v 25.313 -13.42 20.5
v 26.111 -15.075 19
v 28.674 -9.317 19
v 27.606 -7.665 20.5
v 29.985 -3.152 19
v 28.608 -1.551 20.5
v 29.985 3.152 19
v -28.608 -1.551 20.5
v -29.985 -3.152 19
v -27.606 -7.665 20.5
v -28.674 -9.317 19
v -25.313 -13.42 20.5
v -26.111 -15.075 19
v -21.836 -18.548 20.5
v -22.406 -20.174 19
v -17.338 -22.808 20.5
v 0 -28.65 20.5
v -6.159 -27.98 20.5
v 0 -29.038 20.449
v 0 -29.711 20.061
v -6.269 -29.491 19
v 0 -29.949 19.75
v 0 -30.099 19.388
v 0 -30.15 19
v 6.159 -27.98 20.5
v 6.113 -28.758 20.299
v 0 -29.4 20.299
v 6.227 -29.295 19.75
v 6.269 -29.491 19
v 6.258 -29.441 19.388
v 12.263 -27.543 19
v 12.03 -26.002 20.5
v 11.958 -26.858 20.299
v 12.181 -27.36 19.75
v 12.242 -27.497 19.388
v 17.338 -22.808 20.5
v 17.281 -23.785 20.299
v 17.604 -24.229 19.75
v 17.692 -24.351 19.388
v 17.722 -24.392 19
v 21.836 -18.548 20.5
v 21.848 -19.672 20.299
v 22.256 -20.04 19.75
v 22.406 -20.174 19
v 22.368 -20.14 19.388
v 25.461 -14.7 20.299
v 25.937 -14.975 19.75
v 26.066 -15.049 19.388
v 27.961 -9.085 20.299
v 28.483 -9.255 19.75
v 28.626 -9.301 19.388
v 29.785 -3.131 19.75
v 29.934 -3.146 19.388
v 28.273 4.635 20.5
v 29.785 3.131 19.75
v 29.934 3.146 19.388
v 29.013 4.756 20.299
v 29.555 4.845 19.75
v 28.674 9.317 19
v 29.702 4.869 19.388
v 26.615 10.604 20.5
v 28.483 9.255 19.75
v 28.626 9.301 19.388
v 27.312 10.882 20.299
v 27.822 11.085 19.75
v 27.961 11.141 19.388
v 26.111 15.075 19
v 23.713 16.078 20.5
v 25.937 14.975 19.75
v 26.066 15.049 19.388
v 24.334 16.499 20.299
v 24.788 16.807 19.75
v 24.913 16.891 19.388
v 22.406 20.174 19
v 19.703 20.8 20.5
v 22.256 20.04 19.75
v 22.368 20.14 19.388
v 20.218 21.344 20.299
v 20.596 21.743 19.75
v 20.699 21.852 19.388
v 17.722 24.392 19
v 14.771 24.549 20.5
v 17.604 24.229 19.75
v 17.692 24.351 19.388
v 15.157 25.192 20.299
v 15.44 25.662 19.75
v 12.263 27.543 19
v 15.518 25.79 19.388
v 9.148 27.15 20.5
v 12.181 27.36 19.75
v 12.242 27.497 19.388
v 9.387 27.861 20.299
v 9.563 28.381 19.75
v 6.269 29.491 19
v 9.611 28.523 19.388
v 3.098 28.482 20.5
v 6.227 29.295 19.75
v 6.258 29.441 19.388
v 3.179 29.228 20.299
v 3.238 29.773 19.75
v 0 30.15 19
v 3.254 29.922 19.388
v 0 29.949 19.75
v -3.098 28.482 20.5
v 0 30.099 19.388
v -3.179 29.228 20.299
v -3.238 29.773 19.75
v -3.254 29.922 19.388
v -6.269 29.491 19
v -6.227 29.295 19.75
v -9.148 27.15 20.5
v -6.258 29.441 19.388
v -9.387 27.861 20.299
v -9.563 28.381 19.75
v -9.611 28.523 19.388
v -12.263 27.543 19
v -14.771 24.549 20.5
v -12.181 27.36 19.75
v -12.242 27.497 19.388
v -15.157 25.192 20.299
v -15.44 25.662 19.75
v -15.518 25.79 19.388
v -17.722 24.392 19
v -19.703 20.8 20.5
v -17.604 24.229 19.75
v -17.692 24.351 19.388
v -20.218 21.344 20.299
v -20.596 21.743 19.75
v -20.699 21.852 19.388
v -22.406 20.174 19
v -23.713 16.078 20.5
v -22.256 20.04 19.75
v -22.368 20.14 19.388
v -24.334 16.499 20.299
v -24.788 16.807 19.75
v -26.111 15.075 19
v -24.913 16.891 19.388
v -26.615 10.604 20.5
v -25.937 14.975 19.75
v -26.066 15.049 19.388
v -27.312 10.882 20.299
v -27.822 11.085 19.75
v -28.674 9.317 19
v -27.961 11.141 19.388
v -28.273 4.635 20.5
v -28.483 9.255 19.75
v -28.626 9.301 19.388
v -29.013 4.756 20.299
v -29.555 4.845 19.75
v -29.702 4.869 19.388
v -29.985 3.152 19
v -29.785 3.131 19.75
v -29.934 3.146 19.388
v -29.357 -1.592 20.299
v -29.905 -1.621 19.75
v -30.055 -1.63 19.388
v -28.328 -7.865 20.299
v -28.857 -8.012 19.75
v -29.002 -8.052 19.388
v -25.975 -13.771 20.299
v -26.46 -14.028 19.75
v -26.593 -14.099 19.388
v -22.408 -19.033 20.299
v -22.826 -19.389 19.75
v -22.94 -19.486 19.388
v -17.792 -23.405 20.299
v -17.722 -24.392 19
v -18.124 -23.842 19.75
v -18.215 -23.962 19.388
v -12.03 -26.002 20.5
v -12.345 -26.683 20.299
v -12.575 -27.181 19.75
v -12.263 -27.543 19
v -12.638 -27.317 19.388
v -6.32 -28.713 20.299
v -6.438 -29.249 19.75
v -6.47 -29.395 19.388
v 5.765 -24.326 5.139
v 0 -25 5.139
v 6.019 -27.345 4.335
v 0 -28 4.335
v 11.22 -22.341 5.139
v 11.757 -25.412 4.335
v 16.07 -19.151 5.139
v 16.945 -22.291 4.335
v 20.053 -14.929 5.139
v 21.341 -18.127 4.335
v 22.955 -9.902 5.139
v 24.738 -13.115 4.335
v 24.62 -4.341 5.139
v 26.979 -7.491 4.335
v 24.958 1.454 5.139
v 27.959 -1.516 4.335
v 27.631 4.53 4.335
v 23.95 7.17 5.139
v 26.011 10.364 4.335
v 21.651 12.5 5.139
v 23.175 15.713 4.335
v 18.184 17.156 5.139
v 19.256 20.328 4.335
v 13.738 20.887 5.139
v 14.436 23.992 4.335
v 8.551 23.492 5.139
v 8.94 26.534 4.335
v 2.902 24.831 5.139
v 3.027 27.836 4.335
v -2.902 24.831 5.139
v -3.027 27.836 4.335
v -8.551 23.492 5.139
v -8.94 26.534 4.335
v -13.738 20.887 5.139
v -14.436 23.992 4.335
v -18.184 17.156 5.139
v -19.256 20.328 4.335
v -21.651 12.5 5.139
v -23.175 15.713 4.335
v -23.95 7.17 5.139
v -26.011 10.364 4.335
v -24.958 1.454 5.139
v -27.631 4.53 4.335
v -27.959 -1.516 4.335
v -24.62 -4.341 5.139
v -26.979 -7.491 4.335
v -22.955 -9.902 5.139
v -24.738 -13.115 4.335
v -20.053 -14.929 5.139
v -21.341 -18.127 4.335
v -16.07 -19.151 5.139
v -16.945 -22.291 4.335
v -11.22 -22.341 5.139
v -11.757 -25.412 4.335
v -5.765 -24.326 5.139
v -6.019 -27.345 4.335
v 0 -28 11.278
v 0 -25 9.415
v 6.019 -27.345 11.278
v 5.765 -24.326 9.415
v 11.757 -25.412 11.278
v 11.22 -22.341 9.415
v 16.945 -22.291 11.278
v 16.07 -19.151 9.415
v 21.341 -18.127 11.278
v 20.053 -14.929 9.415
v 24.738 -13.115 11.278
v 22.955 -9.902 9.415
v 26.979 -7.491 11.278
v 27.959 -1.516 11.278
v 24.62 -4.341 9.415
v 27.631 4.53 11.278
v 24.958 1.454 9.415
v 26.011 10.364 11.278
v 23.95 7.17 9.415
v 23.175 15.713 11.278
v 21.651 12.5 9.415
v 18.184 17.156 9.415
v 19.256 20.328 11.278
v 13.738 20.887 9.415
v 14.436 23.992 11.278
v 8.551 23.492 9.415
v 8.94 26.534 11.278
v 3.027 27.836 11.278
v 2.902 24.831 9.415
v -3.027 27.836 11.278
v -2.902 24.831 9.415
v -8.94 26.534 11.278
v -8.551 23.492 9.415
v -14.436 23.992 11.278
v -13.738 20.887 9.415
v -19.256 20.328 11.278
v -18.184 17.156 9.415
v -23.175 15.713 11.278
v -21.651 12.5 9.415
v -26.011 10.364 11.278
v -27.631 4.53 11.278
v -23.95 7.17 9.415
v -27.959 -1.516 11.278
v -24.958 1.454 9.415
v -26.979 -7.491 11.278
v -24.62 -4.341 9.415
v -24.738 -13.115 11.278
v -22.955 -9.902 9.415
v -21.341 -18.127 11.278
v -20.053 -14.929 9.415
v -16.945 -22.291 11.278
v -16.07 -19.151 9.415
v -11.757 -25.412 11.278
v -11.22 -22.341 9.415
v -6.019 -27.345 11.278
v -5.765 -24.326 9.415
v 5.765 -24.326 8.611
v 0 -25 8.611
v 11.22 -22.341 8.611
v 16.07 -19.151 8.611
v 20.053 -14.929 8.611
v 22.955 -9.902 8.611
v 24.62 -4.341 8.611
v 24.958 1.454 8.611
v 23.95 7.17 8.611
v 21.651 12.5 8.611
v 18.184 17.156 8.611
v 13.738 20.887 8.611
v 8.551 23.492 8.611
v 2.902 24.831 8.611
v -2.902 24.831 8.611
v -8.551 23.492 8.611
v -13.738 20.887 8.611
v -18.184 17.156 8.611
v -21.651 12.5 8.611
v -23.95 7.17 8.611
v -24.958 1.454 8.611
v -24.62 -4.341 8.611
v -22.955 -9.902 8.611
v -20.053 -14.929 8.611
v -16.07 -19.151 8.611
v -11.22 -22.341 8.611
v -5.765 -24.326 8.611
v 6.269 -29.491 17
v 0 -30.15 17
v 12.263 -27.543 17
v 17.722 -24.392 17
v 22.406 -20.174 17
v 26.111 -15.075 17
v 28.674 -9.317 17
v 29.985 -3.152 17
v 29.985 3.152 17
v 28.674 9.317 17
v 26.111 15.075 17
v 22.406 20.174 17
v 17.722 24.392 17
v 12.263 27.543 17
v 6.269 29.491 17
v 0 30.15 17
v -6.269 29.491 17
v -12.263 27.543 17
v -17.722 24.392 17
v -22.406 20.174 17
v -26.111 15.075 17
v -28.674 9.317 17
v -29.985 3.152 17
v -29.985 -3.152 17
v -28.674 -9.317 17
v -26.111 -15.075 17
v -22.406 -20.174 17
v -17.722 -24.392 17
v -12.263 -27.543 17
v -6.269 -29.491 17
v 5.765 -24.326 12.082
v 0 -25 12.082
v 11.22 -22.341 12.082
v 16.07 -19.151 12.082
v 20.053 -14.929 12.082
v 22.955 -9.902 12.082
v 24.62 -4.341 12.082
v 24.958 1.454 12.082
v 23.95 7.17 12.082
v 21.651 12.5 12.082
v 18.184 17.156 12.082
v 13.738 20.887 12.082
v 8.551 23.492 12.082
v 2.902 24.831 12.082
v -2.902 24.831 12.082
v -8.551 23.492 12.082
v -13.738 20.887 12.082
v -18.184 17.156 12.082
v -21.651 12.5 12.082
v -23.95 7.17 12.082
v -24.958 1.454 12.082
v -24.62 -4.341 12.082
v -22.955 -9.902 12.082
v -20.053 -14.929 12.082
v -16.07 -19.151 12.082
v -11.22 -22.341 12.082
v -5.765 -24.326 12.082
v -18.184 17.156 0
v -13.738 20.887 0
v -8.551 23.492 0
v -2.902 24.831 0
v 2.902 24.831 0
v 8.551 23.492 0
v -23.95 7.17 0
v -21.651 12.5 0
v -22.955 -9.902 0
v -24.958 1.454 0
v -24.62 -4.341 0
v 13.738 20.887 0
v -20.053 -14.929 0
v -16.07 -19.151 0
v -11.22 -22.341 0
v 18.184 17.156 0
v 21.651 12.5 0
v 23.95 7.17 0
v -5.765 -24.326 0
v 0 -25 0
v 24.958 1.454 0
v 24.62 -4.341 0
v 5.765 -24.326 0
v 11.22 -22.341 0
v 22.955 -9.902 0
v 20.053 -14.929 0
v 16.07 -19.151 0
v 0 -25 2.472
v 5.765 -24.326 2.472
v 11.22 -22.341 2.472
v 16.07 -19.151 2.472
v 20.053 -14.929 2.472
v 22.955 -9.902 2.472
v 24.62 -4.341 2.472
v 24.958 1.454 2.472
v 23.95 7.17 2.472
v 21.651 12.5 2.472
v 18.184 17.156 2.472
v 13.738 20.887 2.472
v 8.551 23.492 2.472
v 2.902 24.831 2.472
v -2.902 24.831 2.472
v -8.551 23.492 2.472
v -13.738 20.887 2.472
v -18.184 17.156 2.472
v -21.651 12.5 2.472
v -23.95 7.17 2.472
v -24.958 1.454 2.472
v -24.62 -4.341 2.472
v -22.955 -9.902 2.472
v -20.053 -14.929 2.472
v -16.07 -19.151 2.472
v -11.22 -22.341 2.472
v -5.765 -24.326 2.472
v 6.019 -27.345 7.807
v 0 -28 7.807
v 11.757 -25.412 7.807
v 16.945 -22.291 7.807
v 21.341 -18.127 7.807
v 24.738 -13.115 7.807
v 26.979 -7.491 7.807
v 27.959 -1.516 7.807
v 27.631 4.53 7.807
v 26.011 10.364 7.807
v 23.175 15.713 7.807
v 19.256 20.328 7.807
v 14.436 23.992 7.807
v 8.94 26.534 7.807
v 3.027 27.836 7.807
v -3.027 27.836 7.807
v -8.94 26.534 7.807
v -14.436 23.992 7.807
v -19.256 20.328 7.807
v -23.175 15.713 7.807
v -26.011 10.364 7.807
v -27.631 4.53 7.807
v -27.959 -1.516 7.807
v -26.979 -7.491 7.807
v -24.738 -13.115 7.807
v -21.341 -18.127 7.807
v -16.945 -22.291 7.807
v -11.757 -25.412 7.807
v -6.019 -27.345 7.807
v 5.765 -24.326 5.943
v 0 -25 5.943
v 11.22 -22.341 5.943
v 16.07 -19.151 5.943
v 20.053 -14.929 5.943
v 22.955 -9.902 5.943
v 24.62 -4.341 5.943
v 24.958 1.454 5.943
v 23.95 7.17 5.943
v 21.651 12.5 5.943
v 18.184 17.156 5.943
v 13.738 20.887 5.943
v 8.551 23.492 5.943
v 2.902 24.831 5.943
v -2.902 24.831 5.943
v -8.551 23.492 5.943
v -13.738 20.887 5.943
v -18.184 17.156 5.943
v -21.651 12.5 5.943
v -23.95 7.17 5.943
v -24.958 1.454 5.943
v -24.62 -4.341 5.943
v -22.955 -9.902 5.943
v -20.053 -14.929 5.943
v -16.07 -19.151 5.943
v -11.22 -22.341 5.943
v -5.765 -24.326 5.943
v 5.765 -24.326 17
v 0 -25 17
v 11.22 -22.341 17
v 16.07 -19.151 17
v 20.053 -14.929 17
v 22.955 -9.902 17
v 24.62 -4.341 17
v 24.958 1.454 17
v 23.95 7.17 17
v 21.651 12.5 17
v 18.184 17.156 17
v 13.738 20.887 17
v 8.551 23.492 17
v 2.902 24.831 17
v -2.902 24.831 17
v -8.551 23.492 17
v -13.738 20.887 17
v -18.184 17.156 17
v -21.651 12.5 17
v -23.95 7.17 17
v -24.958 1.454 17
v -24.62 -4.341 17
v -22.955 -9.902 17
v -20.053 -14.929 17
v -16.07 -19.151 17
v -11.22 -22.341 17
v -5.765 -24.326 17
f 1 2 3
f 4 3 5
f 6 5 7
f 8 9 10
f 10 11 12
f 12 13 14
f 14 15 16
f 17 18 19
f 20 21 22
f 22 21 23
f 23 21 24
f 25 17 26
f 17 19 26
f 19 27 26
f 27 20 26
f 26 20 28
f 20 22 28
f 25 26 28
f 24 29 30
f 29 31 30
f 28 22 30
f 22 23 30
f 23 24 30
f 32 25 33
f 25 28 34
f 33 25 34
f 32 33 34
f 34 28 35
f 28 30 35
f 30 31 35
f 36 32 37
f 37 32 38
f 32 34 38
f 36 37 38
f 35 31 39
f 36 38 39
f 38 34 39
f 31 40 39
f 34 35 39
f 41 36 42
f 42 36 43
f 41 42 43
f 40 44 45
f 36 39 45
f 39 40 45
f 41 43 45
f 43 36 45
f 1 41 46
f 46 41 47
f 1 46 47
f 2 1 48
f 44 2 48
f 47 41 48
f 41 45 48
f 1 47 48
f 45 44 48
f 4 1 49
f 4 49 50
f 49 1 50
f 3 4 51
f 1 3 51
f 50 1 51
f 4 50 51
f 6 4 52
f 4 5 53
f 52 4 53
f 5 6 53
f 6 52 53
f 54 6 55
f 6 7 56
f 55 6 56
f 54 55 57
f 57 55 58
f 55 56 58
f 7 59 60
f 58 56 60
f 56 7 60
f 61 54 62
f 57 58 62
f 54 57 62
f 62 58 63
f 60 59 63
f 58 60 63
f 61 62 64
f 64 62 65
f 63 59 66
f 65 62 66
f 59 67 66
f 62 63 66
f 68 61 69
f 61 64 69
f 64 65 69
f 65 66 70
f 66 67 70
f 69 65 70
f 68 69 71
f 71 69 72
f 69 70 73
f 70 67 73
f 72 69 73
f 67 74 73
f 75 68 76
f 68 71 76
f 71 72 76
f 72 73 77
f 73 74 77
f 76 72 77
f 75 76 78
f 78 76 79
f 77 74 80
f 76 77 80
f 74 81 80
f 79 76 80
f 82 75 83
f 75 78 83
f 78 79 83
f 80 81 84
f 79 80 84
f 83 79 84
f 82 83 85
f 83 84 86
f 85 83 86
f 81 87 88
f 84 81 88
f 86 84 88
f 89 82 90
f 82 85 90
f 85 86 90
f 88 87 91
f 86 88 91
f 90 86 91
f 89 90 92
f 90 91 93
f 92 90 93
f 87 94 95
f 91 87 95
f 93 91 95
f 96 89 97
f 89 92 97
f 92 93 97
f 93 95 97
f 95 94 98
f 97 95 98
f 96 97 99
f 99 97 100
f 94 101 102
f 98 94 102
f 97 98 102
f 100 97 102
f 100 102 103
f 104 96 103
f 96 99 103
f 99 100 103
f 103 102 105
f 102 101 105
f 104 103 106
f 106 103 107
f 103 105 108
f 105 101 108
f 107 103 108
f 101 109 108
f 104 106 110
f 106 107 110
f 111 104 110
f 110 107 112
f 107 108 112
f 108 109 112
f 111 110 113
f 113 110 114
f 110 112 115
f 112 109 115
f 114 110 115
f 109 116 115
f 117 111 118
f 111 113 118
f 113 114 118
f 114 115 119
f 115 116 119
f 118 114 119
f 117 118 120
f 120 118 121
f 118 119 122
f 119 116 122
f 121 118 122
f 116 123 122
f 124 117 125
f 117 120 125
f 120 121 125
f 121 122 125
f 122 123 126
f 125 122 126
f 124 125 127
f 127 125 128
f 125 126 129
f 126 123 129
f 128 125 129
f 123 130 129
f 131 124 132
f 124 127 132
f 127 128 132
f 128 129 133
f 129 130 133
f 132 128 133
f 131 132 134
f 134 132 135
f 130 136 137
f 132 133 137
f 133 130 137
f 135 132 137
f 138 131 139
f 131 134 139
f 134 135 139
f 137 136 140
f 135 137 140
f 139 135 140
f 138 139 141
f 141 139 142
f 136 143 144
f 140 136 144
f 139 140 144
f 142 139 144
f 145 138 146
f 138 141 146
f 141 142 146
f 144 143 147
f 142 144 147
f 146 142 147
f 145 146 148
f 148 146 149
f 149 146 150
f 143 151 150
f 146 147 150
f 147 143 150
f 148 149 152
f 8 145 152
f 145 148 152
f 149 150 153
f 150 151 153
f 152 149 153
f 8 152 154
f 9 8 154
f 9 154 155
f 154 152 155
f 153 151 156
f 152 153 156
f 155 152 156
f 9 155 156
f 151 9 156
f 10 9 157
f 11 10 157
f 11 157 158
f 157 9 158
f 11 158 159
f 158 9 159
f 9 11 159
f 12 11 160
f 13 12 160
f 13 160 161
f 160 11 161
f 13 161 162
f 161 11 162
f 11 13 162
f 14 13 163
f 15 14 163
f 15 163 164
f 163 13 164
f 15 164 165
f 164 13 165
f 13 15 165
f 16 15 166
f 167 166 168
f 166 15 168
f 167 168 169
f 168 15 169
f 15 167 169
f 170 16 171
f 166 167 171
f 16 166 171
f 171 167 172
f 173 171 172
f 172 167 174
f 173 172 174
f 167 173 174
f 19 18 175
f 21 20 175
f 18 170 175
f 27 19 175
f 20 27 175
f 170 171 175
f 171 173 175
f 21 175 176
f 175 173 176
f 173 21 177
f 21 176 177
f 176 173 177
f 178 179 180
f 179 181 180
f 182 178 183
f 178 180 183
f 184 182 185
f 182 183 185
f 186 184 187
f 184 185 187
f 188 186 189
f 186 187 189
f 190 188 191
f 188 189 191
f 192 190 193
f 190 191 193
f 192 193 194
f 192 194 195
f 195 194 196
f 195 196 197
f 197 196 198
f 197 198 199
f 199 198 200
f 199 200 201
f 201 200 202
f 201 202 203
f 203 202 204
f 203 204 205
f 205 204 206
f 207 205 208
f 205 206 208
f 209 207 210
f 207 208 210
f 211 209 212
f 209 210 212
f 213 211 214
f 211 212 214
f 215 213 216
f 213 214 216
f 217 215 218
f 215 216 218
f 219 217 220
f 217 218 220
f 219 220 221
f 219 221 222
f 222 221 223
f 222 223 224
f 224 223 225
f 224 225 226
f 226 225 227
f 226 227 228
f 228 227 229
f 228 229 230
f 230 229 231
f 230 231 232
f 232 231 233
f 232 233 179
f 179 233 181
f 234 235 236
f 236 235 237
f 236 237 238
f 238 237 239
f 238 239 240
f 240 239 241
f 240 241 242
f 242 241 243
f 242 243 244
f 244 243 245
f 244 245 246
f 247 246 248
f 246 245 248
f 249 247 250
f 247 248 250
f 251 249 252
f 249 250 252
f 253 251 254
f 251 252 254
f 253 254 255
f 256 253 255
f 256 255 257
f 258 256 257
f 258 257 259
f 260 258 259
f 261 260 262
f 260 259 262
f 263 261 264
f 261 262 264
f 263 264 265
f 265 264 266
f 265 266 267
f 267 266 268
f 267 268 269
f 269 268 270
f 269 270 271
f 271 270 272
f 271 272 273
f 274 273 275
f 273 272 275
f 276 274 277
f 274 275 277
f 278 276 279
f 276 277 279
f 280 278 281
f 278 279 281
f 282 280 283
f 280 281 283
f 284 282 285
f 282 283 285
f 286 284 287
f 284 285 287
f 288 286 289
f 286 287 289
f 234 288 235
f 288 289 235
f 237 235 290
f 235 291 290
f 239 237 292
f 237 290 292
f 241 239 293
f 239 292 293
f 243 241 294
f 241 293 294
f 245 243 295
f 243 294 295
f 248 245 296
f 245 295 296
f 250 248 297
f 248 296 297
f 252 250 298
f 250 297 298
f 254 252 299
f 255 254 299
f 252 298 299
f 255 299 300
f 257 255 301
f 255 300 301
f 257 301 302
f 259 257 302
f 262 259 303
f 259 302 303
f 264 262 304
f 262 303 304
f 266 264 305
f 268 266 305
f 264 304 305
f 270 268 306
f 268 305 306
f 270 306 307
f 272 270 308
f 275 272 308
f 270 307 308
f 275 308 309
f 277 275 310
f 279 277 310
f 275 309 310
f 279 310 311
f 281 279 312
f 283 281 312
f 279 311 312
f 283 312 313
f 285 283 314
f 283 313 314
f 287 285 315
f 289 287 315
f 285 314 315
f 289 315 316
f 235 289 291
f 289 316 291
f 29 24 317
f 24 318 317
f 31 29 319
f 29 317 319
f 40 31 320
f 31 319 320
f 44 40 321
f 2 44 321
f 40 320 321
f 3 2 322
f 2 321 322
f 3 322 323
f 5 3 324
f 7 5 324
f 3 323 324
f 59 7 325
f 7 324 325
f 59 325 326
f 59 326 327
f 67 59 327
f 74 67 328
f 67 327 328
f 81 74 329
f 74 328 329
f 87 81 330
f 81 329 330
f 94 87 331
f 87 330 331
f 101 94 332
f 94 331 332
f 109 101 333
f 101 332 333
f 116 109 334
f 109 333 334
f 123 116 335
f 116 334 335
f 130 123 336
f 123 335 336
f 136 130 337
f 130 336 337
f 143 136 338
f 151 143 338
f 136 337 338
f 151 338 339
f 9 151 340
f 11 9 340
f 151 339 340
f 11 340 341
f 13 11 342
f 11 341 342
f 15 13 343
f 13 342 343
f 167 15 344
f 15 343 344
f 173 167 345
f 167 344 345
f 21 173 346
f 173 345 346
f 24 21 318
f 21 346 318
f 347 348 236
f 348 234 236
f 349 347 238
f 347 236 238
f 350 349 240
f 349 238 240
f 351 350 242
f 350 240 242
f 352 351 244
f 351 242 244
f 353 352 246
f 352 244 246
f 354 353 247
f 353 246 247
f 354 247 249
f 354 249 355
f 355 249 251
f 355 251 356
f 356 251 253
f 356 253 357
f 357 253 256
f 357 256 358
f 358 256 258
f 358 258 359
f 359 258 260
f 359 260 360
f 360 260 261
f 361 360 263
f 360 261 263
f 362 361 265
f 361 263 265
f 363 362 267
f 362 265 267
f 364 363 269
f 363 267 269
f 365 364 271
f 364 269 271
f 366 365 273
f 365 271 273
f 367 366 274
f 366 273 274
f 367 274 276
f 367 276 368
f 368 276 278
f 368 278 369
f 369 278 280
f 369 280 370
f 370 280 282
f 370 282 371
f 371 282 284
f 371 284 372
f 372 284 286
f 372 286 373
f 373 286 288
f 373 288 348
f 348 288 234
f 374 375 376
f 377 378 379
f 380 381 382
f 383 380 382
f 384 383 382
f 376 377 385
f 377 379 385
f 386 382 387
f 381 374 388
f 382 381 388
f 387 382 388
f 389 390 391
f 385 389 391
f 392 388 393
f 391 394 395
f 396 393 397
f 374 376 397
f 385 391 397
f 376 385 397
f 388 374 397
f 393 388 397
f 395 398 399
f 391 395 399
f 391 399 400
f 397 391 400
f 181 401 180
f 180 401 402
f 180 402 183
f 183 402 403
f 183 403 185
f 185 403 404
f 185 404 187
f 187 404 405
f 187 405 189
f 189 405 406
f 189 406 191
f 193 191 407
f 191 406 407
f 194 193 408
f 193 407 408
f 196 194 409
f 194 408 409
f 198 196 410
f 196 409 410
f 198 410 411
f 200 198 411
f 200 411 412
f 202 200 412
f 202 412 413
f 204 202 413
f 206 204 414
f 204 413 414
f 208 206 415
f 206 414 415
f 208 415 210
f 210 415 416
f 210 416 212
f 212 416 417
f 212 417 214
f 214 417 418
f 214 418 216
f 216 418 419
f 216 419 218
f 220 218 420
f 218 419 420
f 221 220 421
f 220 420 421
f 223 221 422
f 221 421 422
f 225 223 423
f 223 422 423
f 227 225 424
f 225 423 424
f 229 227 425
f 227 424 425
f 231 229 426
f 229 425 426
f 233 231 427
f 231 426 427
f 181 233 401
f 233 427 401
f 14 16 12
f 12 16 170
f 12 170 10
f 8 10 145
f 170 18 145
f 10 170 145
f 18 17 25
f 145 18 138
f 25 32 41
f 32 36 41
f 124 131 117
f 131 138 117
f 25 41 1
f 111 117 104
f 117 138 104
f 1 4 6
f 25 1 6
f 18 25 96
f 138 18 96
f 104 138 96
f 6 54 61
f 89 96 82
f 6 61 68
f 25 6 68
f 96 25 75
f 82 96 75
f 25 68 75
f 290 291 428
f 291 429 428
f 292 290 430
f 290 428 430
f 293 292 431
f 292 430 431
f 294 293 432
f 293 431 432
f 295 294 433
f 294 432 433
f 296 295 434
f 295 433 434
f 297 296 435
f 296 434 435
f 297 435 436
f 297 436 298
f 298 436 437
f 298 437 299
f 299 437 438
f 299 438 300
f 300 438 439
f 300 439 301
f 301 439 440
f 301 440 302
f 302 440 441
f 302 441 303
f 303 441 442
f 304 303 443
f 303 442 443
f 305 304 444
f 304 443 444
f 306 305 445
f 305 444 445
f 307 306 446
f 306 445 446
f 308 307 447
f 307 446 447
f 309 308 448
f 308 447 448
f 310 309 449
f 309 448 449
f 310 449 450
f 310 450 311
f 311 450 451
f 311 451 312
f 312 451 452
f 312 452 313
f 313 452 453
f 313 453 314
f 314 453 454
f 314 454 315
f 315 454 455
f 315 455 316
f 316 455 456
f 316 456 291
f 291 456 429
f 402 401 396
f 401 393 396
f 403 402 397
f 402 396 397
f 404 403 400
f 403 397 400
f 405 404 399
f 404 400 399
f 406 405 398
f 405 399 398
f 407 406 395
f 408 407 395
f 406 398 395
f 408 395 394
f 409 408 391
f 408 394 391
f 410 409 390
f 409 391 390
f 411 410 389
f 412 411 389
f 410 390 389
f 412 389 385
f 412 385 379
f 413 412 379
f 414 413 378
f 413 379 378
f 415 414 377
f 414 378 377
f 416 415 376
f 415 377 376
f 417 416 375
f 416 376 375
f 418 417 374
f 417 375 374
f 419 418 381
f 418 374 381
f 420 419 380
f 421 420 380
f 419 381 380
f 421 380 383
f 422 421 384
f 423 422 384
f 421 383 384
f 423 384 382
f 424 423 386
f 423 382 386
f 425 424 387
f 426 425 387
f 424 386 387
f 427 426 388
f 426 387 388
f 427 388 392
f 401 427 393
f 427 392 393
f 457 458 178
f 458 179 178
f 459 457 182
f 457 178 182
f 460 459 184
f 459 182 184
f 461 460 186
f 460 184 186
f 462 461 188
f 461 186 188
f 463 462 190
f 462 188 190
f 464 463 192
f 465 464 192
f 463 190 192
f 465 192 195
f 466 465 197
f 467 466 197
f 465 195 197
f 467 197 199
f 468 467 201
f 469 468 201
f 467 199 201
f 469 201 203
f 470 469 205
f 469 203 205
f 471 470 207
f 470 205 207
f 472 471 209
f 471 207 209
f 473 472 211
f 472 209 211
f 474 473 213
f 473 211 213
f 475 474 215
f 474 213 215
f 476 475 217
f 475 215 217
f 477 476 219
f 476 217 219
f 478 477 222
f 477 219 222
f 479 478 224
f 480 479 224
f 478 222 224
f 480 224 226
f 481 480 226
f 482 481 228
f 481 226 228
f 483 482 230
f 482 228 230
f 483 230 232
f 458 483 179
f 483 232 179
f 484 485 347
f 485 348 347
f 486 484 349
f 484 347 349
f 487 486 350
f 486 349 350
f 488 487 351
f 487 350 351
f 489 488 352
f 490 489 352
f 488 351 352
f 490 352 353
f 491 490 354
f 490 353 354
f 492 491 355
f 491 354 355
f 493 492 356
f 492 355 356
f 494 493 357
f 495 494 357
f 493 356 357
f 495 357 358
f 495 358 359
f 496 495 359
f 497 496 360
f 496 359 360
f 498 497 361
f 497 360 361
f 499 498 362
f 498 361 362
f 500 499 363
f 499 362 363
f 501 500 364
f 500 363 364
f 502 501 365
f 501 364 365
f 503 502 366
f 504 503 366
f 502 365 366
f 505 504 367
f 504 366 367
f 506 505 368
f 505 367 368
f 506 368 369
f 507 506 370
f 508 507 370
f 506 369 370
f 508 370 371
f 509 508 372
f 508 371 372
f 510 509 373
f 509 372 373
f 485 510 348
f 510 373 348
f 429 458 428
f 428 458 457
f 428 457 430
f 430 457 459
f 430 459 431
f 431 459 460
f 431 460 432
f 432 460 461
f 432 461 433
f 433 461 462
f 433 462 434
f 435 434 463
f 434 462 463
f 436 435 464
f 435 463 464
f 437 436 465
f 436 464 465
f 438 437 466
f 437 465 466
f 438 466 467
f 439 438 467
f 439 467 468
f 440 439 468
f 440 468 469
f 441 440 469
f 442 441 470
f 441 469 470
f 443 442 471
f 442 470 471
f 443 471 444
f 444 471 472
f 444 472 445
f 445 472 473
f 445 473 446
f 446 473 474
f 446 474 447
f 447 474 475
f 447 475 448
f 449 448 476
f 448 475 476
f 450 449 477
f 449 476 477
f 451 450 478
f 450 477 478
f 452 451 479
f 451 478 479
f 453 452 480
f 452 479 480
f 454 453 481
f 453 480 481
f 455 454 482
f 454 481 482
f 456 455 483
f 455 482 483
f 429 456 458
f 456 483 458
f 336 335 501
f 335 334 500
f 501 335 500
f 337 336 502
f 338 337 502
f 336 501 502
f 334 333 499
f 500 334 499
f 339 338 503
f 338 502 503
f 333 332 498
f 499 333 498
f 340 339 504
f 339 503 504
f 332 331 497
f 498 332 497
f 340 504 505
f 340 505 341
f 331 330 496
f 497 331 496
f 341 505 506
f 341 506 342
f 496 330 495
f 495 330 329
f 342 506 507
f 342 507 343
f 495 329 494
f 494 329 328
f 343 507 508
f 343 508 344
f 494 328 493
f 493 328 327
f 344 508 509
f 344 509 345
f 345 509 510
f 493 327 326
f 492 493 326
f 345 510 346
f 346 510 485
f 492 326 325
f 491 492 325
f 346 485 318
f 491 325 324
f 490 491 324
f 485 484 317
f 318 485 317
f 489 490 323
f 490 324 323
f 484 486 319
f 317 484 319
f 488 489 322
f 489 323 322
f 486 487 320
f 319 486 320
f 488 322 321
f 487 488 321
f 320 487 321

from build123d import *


with BuildPart() as f1:
    # F0 (on Right) → F1 (revolve)
    with BuildSketch(Plane.YZ):
        Polygon((-25, 11.278154), (-25, 12.082125), (-28, 11.278154), align=None)
        with BuildLine():
            Line((0, 0), (0, 20.5))
            Line((0, 20.5), (-28.65, 20.5))
            ThreePointArc((-28.65, 20.5), (-29.71066, 20.06066), (-30.15, 19))
            Line((-30.15, 19), (-30.15, 17))
            Line((-30.15, 17), (-25, 17))
            Line((-25, 17), (-25, 12.082125))
            Line((-25, 12.082125), (-25, 11.278154))
            Line((-25, 11.278154), (-25, 9.414572))
            Line((-25, 9.414572), (-25, 8.610601))
            Line((-25, 8.610601), (-25, 7.80663))
            Line((-25, 7.80663), (-25, 5.943048))
            Line((-25, 5.943048), (-25, 5.139077))
            Line((-25, 5.139077), (-25, 4.335106))
            Line((-25, 4.335106), (-25, 2.471524))
            Line((-25, 2.471524), (-25, 0))
            Line((-25, 0), (0, 0))
        make_face()
        Polygon((-28, 4.335106), (-25, 2.471524), (-25, 4.335106), align=None)
        Polygon((-28, 7.80663), (-25, 7.80663), (-25, 8.610601), align=None)
        Polygon((-25, 9.414572), (-25, 11.278154), (-28, 11.278154), align=None)
        Polygon((-28, 4.335106), (-25, 4.335106), (-25, 5.139077), align=None)
        Polygon((-28, 7.80663), (-25, 5.943048), (-25, 7.80663), align=None)
    revolve(axis=Axis((0, 0, 10.25), (0, 0, 1)))


solid = f1.part
